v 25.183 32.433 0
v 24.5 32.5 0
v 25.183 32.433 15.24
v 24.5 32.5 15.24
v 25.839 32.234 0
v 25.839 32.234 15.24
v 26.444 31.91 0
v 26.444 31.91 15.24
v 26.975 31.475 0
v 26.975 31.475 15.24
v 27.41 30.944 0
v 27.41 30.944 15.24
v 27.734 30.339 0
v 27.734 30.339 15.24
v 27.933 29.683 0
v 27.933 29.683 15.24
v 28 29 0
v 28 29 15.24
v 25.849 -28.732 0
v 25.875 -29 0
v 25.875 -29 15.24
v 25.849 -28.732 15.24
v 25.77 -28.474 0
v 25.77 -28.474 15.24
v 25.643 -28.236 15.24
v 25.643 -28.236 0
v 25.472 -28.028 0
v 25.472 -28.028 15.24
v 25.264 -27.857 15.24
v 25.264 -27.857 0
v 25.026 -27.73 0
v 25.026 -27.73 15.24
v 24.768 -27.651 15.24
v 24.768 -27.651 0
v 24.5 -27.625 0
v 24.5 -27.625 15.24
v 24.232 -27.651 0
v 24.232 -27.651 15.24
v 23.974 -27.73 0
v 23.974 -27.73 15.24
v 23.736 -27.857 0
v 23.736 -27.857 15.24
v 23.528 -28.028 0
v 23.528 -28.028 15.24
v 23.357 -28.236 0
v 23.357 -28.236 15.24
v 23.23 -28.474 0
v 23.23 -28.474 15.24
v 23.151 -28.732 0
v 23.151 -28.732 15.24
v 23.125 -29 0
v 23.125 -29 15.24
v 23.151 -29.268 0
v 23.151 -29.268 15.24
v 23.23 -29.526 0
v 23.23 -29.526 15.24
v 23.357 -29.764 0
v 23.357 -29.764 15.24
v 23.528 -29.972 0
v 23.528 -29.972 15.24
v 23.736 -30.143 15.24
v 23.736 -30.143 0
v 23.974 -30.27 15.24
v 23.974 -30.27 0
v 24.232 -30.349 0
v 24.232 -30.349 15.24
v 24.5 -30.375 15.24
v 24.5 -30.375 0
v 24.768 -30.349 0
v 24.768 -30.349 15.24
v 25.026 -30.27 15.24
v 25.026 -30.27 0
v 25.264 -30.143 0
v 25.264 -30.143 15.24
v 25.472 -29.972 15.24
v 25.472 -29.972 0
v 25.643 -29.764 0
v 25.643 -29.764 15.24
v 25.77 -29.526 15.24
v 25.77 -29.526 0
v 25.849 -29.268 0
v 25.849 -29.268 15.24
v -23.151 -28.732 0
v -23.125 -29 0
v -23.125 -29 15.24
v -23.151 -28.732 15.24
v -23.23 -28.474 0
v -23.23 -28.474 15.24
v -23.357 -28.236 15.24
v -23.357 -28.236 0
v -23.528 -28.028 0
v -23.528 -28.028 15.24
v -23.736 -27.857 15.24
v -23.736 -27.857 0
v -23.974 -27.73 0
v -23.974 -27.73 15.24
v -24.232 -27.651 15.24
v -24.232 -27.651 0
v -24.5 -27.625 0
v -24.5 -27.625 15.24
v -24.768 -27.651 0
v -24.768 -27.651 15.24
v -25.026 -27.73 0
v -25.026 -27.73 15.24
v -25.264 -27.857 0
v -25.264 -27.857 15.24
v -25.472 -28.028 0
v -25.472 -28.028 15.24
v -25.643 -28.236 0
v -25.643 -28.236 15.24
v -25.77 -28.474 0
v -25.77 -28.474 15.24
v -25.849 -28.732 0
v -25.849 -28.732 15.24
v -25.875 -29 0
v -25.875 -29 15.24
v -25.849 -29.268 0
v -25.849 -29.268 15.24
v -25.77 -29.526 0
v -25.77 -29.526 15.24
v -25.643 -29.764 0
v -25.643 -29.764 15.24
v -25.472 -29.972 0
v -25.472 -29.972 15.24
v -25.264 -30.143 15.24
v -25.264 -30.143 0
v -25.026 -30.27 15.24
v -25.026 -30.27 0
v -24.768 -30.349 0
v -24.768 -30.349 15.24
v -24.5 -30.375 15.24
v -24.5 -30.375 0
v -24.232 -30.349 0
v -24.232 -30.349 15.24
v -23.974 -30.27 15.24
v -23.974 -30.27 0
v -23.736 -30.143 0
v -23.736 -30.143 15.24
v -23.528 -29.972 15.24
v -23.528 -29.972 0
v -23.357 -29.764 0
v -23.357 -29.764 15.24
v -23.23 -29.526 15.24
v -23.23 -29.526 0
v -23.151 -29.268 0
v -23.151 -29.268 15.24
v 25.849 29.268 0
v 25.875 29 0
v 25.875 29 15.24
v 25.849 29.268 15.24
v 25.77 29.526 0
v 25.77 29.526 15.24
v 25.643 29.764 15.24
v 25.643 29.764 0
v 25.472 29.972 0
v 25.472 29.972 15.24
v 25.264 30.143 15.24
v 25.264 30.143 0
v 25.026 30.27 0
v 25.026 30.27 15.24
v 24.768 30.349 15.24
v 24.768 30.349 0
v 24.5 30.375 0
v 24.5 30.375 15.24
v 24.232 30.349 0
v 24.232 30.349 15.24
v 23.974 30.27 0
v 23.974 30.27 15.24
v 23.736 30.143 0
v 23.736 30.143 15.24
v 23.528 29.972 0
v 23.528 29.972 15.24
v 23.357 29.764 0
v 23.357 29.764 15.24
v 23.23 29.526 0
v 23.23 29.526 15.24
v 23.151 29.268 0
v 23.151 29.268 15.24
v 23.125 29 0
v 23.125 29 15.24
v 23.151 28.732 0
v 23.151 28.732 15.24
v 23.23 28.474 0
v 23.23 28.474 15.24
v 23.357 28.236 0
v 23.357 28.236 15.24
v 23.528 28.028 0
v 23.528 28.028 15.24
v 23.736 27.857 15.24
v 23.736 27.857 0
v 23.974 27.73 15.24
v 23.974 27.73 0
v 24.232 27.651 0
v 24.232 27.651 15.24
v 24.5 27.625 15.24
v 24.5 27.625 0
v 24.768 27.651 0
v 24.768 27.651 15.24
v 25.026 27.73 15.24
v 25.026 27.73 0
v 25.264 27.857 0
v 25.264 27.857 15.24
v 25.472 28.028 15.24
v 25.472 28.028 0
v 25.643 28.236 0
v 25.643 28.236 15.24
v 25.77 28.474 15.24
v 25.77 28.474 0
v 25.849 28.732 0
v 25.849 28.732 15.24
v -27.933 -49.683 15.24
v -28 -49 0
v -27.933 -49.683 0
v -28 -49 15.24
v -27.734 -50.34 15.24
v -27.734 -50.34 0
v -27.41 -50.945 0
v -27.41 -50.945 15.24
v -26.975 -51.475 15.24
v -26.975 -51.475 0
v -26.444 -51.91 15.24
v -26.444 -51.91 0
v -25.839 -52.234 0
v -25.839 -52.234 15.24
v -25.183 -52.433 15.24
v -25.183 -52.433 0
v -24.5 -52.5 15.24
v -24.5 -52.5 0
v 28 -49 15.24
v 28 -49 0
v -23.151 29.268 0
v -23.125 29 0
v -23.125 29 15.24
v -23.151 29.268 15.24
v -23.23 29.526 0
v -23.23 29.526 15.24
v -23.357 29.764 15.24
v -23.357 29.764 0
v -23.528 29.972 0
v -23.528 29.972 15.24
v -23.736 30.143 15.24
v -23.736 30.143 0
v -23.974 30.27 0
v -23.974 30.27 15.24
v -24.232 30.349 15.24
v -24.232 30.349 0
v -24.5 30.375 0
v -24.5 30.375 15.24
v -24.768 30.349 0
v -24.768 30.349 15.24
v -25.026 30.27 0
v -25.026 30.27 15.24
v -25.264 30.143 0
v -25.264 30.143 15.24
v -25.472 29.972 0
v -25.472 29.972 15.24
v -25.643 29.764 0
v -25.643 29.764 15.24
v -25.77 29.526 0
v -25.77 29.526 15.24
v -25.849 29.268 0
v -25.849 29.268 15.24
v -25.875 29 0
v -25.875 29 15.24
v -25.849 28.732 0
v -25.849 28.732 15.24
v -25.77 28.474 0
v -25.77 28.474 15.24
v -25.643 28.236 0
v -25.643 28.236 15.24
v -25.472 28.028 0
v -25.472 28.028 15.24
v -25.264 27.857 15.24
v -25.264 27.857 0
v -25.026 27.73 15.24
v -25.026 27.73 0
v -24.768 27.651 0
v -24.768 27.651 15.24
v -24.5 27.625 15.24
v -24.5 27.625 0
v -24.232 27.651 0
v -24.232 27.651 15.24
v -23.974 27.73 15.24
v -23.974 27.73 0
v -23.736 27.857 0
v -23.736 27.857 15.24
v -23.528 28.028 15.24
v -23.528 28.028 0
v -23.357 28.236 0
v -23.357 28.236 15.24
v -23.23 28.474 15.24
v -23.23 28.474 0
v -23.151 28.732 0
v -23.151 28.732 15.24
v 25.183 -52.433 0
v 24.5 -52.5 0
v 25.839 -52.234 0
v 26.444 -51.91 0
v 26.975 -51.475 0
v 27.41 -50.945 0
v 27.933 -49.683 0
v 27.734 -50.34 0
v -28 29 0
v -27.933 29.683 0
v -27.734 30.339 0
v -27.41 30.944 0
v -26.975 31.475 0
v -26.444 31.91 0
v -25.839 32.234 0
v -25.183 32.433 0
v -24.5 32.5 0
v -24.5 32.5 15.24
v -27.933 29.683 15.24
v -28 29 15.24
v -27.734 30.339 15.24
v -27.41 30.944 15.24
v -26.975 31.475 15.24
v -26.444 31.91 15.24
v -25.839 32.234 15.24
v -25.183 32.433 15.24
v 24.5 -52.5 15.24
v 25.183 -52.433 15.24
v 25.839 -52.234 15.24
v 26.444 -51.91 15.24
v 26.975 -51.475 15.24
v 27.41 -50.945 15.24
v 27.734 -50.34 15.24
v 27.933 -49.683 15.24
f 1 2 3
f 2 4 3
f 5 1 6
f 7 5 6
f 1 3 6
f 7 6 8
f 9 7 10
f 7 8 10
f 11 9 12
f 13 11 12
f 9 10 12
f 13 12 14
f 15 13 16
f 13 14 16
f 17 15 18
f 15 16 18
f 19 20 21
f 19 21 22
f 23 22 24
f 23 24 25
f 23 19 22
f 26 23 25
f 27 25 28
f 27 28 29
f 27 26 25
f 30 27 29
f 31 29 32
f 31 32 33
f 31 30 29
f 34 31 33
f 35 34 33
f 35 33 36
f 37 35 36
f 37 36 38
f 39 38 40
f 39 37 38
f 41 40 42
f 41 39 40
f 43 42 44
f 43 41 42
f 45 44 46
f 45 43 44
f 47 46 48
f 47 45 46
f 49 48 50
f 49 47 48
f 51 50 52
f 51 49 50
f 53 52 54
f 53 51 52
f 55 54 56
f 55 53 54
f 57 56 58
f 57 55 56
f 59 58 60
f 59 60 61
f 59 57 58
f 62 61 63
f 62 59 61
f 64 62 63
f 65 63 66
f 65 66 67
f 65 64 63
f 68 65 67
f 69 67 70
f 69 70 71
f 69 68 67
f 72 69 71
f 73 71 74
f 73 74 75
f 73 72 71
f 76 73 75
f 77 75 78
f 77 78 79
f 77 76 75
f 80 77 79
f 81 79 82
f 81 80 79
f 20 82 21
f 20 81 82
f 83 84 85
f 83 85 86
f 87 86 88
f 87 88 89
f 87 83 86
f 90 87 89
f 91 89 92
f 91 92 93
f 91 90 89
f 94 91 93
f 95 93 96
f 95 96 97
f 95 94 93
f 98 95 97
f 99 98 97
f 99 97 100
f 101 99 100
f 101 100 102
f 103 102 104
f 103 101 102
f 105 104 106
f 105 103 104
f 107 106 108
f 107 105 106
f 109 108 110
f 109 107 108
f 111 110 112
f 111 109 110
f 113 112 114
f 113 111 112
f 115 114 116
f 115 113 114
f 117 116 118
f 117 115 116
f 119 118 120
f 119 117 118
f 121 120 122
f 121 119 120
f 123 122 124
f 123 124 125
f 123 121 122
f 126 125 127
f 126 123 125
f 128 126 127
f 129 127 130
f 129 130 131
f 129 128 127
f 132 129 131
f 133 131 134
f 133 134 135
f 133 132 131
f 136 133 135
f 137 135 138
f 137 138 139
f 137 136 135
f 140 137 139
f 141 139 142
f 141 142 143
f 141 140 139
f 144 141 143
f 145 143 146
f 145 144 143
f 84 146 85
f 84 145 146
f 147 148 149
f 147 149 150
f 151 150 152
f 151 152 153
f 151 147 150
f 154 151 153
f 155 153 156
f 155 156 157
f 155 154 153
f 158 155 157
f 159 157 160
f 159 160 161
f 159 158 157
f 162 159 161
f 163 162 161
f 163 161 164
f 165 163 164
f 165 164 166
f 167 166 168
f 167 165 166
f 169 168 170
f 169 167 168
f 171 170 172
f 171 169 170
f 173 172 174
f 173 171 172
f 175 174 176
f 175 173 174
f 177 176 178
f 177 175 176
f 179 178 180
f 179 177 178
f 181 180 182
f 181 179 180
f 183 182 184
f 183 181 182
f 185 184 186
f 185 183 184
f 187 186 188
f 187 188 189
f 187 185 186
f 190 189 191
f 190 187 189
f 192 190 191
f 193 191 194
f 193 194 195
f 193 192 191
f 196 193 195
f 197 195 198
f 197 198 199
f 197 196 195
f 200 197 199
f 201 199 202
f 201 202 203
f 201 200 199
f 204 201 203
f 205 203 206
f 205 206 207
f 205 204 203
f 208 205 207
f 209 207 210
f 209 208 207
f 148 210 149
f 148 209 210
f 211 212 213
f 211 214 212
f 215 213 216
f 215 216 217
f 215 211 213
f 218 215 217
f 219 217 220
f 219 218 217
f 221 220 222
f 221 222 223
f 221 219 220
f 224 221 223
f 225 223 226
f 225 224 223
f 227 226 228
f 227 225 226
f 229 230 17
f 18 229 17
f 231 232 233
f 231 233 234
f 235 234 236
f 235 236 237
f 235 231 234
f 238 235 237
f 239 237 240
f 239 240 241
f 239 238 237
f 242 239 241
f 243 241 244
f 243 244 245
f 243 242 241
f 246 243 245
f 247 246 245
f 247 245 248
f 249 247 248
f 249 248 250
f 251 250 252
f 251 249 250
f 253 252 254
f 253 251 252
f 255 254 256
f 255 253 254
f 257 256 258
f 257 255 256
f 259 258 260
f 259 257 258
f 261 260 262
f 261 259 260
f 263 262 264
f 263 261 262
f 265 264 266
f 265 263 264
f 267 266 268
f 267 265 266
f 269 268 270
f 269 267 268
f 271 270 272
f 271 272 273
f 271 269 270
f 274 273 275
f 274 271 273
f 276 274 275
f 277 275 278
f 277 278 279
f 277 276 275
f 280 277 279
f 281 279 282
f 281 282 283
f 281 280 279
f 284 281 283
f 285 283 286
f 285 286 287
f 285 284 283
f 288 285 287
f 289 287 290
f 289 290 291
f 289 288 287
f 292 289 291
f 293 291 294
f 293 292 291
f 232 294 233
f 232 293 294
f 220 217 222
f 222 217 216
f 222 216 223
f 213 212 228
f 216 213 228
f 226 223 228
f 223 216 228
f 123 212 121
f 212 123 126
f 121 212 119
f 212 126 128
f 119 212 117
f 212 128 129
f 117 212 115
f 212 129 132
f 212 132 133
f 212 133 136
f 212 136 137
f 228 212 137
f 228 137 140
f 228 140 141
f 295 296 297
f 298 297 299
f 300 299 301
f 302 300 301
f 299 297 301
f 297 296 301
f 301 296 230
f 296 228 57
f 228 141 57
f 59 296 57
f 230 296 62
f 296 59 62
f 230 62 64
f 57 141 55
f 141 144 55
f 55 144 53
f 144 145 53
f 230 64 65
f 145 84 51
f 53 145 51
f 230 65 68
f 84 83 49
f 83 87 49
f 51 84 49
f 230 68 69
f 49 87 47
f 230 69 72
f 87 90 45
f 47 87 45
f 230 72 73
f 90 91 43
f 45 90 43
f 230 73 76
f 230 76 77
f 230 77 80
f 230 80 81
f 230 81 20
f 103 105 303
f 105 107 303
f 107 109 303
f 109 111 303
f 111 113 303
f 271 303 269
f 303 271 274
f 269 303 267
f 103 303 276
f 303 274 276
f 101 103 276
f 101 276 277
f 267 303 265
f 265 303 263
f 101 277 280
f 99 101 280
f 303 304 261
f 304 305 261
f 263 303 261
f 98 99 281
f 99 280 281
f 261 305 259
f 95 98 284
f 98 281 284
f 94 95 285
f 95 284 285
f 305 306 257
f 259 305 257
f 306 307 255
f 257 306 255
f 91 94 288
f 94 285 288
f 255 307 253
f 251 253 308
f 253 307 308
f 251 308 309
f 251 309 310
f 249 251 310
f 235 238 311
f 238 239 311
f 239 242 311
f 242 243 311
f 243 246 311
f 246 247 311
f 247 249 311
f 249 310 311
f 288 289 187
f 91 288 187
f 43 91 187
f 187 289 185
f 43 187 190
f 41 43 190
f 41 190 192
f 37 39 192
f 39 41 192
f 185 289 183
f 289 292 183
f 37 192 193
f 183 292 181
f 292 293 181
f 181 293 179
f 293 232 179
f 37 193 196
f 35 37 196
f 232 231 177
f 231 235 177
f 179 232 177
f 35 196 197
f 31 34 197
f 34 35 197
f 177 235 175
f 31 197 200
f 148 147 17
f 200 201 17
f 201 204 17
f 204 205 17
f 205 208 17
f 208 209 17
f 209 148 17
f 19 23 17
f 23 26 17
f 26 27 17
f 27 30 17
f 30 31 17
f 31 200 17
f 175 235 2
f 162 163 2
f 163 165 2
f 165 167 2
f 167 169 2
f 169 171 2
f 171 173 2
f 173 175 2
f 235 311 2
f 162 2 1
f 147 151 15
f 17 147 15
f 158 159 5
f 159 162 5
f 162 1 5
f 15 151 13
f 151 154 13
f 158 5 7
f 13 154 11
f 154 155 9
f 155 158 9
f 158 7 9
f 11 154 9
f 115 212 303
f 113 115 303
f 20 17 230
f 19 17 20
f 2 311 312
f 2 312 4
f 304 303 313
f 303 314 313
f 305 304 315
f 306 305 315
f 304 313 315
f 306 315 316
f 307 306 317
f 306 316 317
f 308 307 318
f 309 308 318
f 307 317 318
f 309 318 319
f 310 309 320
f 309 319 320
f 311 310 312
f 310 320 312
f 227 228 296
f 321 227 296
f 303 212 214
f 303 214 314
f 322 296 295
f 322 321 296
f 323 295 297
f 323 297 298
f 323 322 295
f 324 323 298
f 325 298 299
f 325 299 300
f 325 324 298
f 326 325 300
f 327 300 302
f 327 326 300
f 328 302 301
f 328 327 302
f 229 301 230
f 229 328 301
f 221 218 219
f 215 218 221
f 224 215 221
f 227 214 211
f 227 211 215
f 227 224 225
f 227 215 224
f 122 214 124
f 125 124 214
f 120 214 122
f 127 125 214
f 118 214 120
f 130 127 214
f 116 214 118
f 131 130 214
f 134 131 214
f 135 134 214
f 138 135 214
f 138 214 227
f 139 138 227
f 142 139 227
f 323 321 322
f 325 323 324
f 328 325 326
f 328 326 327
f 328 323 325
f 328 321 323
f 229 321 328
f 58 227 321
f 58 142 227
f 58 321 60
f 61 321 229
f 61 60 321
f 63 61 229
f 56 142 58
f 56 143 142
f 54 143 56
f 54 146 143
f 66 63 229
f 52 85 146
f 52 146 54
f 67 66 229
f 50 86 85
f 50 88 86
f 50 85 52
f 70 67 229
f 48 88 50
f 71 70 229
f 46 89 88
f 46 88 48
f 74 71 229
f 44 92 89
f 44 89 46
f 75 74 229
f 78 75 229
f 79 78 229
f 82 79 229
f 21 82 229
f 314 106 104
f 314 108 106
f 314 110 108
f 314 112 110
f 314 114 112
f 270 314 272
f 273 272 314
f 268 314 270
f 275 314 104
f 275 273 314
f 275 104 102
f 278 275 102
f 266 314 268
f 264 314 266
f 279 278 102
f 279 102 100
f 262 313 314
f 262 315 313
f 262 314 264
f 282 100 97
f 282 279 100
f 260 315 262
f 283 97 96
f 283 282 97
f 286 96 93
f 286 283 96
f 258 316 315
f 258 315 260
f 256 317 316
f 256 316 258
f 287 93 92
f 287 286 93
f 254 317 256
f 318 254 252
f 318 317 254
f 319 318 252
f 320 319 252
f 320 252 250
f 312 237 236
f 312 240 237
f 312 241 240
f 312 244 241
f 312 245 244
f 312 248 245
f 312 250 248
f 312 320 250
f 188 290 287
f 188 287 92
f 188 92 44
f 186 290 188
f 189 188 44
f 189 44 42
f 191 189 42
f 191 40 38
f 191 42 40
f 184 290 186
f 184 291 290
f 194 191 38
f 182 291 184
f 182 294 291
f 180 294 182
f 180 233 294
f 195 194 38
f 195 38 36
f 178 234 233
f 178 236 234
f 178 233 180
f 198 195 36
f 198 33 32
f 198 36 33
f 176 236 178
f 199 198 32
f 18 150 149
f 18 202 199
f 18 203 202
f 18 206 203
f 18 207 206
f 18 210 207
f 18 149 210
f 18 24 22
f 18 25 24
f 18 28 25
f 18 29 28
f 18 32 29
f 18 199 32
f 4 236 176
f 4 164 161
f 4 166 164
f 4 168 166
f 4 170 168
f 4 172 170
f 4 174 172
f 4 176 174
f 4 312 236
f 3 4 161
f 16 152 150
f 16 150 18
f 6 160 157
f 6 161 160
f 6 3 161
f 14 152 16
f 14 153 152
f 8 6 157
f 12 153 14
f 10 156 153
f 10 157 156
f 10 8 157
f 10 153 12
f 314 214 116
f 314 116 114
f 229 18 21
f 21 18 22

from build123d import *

# Parameters (mm, degrees)
F0_W     = 55.999888
F0_H     = 85.000084
F0_R     = 1.375
F1_DEPTH = 15.24
F2_R     = 3.499993


with BuildPart() as f1:
    # F0 (on Top) → F1 (new body)
    with BuildSketch(Plane.XY):
        with Locations((0, -10.000107)):
            Rectangle(F0_W, F0_H)
        with Locations((-24.499951, -28.999942)):
            Circle(F0_R, mode=Mode.SUBTRACT)
        with Locations((24.499951, -28.999942)):
            Circle(F0_R, mode=Mode.SUBTRACT)
        with Locations((-24.499951, 28.999942)):
            Circle(F0_R, mode=Mode.SUBTRACT)
        with Locations((24.499951, 28.999942)):
            Circle(F0_R, mode=Mode.SUBTRACT)
    extrude(amount=F1_DEPTH)

    # F2
    f2_edges = [f1.edges().sort_by_distance(p)[0] for p in [
        (-27.999944, 32.499935, 7.62),
        (27.999944, 32.499935, 7.62),
        (27.999944, -52.500149, 7.62),
        (-27.999944, -52.500149, 7.62),
    ]]
    fillet(f2_edges, radius=F2_R)


solid = f1.part
